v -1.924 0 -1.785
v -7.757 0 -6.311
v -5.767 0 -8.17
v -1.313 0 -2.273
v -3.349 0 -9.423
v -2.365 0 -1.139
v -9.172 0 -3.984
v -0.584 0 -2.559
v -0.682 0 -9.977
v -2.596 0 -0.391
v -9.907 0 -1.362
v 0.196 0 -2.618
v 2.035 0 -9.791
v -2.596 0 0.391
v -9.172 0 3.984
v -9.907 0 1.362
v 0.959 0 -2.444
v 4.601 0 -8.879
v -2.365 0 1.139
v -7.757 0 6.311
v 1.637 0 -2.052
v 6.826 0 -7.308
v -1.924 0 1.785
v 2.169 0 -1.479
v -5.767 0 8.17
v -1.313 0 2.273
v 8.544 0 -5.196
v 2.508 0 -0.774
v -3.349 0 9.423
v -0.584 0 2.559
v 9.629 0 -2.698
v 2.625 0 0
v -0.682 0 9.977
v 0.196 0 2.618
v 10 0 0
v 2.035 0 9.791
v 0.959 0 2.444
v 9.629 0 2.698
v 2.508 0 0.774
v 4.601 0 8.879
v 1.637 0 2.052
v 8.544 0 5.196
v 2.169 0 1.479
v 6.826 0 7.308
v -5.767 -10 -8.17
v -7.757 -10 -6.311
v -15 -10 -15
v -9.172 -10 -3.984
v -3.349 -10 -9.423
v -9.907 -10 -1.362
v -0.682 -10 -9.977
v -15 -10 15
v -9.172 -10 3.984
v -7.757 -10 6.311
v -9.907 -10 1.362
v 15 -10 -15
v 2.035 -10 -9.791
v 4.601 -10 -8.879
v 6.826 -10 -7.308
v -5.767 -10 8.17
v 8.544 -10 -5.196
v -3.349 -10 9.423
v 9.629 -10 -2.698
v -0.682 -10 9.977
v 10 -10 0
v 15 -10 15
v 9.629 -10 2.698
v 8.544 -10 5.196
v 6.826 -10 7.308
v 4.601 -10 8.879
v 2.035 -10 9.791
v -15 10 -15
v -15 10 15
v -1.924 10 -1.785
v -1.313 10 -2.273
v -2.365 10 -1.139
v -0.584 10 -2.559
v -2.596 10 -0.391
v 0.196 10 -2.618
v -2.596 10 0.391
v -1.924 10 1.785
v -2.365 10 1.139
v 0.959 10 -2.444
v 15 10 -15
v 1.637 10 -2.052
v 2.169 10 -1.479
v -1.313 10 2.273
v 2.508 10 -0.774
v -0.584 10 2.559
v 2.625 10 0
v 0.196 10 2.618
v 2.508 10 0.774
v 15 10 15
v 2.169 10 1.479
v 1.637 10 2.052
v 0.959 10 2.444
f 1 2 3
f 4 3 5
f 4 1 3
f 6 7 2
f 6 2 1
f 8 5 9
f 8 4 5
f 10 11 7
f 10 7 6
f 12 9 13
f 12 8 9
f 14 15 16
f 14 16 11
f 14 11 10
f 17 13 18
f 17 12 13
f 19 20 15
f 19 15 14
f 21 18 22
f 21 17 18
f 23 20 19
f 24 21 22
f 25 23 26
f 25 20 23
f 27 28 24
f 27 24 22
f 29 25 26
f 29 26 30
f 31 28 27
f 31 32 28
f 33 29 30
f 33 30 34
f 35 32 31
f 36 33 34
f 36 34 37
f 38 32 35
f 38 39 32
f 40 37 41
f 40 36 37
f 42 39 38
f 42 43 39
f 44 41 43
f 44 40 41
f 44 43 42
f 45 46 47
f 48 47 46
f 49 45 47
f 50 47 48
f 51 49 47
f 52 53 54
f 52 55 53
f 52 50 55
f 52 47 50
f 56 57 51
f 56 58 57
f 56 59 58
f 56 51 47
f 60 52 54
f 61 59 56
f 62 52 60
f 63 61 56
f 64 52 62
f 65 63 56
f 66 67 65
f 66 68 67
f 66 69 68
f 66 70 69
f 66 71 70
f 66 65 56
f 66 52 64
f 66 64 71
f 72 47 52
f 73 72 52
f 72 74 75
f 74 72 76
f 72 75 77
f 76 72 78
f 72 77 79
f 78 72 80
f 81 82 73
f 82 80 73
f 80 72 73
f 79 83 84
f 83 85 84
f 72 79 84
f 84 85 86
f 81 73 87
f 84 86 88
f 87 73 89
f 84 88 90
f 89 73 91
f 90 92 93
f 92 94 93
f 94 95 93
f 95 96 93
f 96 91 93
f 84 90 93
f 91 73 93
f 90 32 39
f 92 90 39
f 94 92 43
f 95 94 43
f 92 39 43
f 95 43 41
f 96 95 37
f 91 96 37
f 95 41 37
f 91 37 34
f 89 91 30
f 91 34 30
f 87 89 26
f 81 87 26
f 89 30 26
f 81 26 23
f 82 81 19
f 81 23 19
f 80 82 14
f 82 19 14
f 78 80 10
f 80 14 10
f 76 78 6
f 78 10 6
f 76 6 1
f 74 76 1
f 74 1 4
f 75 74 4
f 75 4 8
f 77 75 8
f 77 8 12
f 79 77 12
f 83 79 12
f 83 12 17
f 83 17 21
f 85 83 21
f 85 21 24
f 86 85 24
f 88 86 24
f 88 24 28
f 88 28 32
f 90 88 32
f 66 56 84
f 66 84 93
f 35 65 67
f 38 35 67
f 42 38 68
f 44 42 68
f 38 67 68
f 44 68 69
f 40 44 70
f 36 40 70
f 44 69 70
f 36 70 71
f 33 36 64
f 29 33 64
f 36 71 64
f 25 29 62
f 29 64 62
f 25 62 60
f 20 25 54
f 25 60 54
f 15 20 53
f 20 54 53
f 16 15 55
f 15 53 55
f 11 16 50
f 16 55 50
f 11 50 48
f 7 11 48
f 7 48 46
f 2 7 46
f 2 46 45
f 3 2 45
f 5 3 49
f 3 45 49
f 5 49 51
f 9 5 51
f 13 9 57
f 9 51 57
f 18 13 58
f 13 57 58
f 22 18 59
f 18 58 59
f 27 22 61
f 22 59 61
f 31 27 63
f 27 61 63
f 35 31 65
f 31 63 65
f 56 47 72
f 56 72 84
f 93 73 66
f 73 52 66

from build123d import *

# Parameters (mm, degrees)
F0_W     = 30
F0_H     = 30
F1_DEPTH = 10
F2_R     = 10
F3_DEPTH = 10
F5_D     = 5.25


with BuildPart() as f1:
    # F0 (on Front) → F1 (new body, symmetric)
    with BuildSketch(Plane.XZ):
        Rectangle(F0_W, F0_H)
    extrude(amount=F1_DEPTH, both=True)

    # F2 (on face) → F3 (cut)
    with BuildSketch(Plane.XZ.offset(10)):
        Circle(F2_R)
    extrude(amount=-F3_DEPTH, mode=Mode.SUBTRACT)

    # F5 (through all)
    with Locations(Plane(origin=(0, 10, 0), x_dir=(-1, 0, 0), z_dir=(0, 1, 0))):
        with Locations((0, 0)):
            Hole(F5_D / 2)


solid = f1.part
